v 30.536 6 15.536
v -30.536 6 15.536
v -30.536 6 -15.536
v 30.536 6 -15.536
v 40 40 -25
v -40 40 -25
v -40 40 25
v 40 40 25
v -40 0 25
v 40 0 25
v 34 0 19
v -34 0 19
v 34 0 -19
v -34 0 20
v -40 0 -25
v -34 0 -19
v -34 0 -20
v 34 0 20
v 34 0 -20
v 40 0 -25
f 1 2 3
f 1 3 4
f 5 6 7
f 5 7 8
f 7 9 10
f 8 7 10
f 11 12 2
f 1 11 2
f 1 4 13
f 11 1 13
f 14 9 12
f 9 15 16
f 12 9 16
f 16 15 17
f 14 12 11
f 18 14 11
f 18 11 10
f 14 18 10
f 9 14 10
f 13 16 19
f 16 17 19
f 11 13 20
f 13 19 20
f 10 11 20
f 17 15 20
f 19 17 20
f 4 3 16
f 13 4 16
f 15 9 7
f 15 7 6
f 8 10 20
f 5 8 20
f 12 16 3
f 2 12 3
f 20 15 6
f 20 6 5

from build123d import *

# Parameters (mm, degrees)
SKETCH2_W           = 80
SKETCH2_H           = 50
BOSS_EXTRUDE1_DEPTH = 40
SKETCH3_W           = 68
SKETCH3_H           = 38
CUT_EXTRUDE1_DEPTH  = 6
DRAFT1_START        = -34
DRAFT1_DEPTH        = 68
DRAFT1_START_2      = -20
DRAFT1_2_DEPTH      = 40


with BuildPart() as part:
    # Sketch2 → Boss-Extrude1 (new body)
    with BuildSketch(Plane(origin=(0, 0, 0), x_dir=(1, 0, 0), z_dir=(0, 1, 0))):
        Rectangle(SKETCH2_W, SKETCH2_H)
    extrude(amount=BOSS_EXTRUDE1_DEPTH)

    # Sketch3 → Cut-Extrude1 (cut)
    with BuildSketch(Plane.XZ):
        Rectangle(SKETCH3_W, SKETCH3_H)
    extrude(amount=-CUT_EXTRUDE1_DEPTH, mode=Mode.SUBTRACT)

    # Draft1: read off the stored shape, not the designer's step
    # Draft1 outline → Draft1 (add)
    with BuildSketch(Plane.YZ.offset(DRAFT1_START)):
        Polygon((6, 19), (0, 19), (6, 15.535898385), align=None)
        Polygon((6, -19), (6, -15.535898385), (0, -19), align=None)
    extrude(amount=DRAFT1_DEPTH)

    # Draft1 2 outline → Draft1 2 (add)
    with BuildSketch(Plane.XY.offset(DRAFT1_START_2)):
        Polygon((34, 6), (30.535898385, 6), (34, 0), align=None)
        Polygon((-34, 0), (-30.535898385, 6), (-34, 6), align=None)
    extrude(amount=DRAFT1_2_DEPTH)


solid = part.part
